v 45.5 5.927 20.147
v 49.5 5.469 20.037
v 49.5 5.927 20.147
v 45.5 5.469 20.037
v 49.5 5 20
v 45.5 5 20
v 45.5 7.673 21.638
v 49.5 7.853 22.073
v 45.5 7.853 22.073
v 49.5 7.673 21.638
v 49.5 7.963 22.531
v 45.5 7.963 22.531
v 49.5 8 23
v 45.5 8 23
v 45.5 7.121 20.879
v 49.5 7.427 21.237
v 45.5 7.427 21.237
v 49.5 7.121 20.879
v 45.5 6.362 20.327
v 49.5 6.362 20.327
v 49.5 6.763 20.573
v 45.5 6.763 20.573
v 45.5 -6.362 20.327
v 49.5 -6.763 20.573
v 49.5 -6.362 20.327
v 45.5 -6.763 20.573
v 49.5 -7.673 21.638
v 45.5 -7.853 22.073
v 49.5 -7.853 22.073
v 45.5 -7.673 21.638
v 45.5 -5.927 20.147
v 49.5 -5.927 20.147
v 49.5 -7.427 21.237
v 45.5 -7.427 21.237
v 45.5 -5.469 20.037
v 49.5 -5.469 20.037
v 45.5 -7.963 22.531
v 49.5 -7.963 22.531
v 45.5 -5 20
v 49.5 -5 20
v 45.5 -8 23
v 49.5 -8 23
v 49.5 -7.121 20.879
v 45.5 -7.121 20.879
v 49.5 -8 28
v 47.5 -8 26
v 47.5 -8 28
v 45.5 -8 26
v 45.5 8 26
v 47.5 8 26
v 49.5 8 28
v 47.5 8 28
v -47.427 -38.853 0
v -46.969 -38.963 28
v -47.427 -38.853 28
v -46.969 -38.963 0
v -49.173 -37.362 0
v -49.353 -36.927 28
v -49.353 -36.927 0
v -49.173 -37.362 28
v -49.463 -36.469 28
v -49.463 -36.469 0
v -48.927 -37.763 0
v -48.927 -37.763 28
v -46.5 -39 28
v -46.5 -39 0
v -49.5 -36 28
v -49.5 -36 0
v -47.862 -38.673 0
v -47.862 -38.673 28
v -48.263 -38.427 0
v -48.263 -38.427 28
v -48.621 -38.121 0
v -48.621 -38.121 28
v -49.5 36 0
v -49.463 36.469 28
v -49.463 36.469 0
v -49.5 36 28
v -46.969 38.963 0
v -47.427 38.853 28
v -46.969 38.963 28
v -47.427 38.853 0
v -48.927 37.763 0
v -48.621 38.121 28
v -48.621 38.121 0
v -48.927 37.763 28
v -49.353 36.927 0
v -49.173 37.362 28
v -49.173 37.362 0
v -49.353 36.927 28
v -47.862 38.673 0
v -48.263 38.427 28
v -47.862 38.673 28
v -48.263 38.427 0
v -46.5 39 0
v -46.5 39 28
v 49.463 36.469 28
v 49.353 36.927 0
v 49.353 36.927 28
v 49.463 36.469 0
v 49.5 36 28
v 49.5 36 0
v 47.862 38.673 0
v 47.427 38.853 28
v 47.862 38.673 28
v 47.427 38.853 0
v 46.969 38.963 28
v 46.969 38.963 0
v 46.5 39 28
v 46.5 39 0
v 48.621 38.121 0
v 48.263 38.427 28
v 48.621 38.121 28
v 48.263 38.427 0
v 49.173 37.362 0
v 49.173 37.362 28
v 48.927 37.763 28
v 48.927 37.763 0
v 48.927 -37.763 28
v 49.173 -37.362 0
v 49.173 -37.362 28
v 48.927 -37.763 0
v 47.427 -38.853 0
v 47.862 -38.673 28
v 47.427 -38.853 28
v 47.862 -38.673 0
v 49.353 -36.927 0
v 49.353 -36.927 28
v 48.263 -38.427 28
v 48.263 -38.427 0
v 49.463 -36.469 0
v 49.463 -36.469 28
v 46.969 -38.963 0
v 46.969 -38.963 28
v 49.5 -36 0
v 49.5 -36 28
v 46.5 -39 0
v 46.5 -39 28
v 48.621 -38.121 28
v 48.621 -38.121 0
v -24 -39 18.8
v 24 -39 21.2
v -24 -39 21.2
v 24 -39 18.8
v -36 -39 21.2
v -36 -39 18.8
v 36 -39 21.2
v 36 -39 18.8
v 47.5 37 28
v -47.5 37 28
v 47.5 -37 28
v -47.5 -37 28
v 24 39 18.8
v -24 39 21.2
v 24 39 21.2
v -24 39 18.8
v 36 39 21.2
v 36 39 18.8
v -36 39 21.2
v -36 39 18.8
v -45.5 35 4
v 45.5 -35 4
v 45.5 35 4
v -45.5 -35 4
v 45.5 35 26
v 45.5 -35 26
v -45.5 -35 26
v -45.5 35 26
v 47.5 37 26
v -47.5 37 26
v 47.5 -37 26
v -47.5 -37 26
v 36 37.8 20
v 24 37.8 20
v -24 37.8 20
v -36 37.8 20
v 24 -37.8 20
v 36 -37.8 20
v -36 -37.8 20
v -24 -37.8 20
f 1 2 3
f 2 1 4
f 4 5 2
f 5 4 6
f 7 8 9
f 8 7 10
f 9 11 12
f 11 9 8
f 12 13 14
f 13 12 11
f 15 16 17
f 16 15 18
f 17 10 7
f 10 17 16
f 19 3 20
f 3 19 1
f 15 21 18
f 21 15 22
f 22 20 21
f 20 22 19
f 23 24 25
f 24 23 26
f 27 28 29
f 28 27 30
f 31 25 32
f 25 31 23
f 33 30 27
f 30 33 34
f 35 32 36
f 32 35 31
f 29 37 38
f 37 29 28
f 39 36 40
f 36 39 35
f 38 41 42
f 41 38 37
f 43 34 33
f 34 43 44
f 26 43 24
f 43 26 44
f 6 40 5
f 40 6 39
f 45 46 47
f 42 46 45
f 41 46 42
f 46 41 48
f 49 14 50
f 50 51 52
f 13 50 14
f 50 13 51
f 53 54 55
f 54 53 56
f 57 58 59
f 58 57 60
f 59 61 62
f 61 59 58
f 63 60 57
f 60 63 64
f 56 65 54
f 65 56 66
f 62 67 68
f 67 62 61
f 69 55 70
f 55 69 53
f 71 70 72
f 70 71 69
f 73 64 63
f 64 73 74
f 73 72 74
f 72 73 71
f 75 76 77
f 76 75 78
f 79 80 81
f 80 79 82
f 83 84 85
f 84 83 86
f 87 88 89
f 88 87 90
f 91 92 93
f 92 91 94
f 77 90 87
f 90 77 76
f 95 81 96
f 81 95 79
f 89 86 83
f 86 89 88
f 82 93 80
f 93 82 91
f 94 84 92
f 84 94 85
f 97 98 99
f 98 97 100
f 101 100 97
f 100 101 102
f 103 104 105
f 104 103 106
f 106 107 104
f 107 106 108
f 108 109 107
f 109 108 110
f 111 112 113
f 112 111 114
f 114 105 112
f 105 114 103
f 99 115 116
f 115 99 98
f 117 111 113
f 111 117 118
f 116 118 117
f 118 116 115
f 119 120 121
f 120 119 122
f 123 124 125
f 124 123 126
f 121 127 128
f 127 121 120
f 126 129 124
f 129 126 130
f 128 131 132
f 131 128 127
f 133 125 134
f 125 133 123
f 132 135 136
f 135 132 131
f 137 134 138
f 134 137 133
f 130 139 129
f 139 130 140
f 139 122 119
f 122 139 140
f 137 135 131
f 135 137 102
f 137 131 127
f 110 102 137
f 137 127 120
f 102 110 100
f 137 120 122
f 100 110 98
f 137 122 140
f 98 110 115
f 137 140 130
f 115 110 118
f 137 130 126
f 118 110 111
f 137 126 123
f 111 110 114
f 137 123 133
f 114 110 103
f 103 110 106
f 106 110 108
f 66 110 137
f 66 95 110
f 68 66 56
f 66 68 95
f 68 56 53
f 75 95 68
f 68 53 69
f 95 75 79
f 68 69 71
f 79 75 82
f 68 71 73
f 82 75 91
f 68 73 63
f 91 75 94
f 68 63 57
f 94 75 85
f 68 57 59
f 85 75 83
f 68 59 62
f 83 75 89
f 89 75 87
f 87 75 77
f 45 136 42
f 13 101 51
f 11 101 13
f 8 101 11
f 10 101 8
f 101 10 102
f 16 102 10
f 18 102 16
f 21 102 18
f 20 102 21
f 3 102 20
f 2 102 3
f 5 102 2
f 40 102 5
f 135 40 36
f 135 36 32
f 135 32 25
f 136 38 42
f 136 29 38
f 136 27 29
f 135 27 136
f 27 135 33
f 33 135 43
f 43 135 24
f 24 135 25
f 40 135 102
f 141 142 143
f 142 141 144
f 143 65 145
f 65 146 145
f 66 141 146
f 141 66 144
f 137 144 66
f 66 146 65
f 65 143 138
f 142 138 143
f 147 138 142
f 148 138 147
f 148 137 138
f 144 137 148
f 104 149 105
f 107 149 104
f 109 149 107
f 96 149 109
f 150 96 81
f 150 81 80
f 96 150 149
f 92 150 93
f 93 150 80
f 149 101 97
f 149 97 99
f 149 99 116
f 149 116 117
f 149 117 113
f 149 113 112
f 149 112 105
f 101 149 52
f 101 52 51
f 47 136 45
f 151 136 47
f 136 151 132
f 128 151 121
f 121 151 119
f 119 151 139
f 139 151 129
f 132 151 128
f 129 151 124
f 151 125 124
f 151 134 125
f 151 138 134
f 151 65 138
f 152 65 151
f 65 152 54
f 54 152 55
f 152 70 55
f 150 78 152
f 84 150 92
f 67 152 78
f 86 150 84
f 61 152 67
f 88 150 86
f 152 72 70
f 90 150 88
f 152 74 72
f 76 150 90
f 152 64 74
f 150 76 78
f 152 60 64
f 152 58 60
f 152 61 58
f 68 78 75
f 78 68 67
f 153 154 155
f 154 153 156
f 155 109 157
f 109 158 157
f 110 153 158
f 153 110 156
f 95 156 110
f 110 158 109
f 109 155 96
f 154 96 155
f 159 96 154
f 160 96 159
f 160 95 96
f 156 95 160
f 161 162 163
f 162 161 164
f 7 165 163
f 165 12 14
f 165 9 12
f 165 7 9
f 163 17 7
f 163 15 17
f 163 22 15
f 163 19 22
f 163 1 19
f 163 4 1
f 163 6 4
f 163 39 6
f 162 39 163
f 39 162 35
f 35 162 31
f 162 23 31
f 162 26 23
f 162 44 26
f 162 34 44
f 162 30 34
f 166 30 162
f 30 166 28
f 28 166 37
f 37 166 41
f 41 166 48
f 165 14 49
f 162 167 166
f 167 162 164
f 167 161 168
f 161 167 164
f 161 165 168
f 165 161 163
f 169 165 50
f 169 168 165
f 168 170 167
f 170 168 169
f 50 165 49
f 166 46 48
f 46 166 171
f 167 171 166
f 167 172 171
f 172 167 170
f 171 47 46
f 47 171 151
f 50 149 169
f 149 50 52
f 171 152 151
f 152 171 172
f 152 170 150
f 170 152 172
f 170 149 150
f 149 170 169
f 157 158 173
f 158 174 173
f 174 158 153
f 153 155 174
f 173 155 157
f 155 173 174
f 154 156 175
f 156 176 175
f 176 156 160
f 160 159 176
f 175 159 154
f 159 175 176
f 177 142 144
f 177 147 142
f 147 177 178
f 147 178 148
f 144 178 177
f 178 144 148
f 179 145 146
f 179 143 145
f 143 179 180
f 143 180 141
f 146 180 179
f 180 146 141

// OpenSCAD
lx = 91;
ly = 70;
lz = 24;

// wall thickness
thickness = 4;

// hole size
w_hole = 16;
h_hole = 8;

// fillet radius
fillet = 3;

// attach points
x_attach = 30;
z_attach = lz - thickness;
l_attach = 12;

lxt = lx + 2*thickness;
lyt = ly + 2*thickness;

module Fillet(r) {
    difference() {
        linear_extrude(3*lz, center=true) square(2*r, center=true);
        union() {
            translate([r, r, 0])
            linear_extrude(4*lz, center=true)
            circle(r, $fn=40);
            translate([r, -r, 0])
            linear_extrude(4*lz, center=true)
            circle(r, $fn=40);
            translate([-r, -r, 0])
            linear_extrude(4*lz, center=true)
            circle(r, $fn=40);
            translate([-r, r, 0])
            linear_extrude(4*lz, center=true)
            circle(r, $fn=40);
        }
    }
};

module WireHole() {
    translate([lx/2-thickness, 0, lz+h_hole/2])
    rotate([0, 90, 0])
    difference() {
        linear_extrude(3*thickness)
        polygon([[-h_hole, -w_hole/2], [-h_hole, w_hole/2], [h_hole, w_hole/2], [h_hole, -w_hole/2]]);
        translate([h_hole, w_hole/2])
        Fillet(fillet);
        translate([h_hole, -w_hole/2])
        Fillet(fillet);
    }
};

module AttachDip(x, y, z, flip) {
    translate([x - l_attach/2, y, z])
    rotate([-45 + 180*flip, 0, 0])
    cube(l_attach);
}

module Box() {
    difference() {
        linear_extrude(lz + thickness)
        polygon([[-lxt/2, -lyt/2], [lxt/2, -lyt/2], [lxt/2, lyt/2], [-lxt/2, lyt/2]]);
        translate([0, 0, thickness])
        linear_extrude(lz + thickness)
        polygon([[-lx/2, -ly/2], [lx/2, -ly/2], [lx/2, ly/2], [-lx/2, ly/2]]);
        WireHole();
        
        // fillet
        translate([-lxt/2, -lyt/2, 0]) Fillet(fillet);
        translate([-lxt/2, lyt/2, 0]) Fillet(fillet);
        translate([lxt/2, lyt/2, 0]) Fillet(fillet);
        translate([lxt/2, -lyt/2, 0]) Fillet(fillet);
        
        // place for lid
        translate([0, 0, lz+thickness/2])
        linear_extrude(thickness)
        polygon([[-(lx+thickness)/2, -(ly+thickness)/2], [(lx+thickness)/2, -(ly+thickness)/2], [(lx+thickness)/2, (ly+thickness)/2], [-(lx+thickness)/2, (ly+thickness)/2]]);
        
        // lid attach points
        AttachDip(x_attach, ly/2 + 0.7*thickness, z_attach, 0);
        AttachDip(-x_attach, ly/2 + 0.7*thickness, z_attach, 0);
        AttachDip(x_attach, -ly/2 - 0.7*thickness, z_attach, 1);
        AttachDip(-x_attach, -ly/2 - 0.7*thickness, z_attach, 1);
    }
};
Box();
